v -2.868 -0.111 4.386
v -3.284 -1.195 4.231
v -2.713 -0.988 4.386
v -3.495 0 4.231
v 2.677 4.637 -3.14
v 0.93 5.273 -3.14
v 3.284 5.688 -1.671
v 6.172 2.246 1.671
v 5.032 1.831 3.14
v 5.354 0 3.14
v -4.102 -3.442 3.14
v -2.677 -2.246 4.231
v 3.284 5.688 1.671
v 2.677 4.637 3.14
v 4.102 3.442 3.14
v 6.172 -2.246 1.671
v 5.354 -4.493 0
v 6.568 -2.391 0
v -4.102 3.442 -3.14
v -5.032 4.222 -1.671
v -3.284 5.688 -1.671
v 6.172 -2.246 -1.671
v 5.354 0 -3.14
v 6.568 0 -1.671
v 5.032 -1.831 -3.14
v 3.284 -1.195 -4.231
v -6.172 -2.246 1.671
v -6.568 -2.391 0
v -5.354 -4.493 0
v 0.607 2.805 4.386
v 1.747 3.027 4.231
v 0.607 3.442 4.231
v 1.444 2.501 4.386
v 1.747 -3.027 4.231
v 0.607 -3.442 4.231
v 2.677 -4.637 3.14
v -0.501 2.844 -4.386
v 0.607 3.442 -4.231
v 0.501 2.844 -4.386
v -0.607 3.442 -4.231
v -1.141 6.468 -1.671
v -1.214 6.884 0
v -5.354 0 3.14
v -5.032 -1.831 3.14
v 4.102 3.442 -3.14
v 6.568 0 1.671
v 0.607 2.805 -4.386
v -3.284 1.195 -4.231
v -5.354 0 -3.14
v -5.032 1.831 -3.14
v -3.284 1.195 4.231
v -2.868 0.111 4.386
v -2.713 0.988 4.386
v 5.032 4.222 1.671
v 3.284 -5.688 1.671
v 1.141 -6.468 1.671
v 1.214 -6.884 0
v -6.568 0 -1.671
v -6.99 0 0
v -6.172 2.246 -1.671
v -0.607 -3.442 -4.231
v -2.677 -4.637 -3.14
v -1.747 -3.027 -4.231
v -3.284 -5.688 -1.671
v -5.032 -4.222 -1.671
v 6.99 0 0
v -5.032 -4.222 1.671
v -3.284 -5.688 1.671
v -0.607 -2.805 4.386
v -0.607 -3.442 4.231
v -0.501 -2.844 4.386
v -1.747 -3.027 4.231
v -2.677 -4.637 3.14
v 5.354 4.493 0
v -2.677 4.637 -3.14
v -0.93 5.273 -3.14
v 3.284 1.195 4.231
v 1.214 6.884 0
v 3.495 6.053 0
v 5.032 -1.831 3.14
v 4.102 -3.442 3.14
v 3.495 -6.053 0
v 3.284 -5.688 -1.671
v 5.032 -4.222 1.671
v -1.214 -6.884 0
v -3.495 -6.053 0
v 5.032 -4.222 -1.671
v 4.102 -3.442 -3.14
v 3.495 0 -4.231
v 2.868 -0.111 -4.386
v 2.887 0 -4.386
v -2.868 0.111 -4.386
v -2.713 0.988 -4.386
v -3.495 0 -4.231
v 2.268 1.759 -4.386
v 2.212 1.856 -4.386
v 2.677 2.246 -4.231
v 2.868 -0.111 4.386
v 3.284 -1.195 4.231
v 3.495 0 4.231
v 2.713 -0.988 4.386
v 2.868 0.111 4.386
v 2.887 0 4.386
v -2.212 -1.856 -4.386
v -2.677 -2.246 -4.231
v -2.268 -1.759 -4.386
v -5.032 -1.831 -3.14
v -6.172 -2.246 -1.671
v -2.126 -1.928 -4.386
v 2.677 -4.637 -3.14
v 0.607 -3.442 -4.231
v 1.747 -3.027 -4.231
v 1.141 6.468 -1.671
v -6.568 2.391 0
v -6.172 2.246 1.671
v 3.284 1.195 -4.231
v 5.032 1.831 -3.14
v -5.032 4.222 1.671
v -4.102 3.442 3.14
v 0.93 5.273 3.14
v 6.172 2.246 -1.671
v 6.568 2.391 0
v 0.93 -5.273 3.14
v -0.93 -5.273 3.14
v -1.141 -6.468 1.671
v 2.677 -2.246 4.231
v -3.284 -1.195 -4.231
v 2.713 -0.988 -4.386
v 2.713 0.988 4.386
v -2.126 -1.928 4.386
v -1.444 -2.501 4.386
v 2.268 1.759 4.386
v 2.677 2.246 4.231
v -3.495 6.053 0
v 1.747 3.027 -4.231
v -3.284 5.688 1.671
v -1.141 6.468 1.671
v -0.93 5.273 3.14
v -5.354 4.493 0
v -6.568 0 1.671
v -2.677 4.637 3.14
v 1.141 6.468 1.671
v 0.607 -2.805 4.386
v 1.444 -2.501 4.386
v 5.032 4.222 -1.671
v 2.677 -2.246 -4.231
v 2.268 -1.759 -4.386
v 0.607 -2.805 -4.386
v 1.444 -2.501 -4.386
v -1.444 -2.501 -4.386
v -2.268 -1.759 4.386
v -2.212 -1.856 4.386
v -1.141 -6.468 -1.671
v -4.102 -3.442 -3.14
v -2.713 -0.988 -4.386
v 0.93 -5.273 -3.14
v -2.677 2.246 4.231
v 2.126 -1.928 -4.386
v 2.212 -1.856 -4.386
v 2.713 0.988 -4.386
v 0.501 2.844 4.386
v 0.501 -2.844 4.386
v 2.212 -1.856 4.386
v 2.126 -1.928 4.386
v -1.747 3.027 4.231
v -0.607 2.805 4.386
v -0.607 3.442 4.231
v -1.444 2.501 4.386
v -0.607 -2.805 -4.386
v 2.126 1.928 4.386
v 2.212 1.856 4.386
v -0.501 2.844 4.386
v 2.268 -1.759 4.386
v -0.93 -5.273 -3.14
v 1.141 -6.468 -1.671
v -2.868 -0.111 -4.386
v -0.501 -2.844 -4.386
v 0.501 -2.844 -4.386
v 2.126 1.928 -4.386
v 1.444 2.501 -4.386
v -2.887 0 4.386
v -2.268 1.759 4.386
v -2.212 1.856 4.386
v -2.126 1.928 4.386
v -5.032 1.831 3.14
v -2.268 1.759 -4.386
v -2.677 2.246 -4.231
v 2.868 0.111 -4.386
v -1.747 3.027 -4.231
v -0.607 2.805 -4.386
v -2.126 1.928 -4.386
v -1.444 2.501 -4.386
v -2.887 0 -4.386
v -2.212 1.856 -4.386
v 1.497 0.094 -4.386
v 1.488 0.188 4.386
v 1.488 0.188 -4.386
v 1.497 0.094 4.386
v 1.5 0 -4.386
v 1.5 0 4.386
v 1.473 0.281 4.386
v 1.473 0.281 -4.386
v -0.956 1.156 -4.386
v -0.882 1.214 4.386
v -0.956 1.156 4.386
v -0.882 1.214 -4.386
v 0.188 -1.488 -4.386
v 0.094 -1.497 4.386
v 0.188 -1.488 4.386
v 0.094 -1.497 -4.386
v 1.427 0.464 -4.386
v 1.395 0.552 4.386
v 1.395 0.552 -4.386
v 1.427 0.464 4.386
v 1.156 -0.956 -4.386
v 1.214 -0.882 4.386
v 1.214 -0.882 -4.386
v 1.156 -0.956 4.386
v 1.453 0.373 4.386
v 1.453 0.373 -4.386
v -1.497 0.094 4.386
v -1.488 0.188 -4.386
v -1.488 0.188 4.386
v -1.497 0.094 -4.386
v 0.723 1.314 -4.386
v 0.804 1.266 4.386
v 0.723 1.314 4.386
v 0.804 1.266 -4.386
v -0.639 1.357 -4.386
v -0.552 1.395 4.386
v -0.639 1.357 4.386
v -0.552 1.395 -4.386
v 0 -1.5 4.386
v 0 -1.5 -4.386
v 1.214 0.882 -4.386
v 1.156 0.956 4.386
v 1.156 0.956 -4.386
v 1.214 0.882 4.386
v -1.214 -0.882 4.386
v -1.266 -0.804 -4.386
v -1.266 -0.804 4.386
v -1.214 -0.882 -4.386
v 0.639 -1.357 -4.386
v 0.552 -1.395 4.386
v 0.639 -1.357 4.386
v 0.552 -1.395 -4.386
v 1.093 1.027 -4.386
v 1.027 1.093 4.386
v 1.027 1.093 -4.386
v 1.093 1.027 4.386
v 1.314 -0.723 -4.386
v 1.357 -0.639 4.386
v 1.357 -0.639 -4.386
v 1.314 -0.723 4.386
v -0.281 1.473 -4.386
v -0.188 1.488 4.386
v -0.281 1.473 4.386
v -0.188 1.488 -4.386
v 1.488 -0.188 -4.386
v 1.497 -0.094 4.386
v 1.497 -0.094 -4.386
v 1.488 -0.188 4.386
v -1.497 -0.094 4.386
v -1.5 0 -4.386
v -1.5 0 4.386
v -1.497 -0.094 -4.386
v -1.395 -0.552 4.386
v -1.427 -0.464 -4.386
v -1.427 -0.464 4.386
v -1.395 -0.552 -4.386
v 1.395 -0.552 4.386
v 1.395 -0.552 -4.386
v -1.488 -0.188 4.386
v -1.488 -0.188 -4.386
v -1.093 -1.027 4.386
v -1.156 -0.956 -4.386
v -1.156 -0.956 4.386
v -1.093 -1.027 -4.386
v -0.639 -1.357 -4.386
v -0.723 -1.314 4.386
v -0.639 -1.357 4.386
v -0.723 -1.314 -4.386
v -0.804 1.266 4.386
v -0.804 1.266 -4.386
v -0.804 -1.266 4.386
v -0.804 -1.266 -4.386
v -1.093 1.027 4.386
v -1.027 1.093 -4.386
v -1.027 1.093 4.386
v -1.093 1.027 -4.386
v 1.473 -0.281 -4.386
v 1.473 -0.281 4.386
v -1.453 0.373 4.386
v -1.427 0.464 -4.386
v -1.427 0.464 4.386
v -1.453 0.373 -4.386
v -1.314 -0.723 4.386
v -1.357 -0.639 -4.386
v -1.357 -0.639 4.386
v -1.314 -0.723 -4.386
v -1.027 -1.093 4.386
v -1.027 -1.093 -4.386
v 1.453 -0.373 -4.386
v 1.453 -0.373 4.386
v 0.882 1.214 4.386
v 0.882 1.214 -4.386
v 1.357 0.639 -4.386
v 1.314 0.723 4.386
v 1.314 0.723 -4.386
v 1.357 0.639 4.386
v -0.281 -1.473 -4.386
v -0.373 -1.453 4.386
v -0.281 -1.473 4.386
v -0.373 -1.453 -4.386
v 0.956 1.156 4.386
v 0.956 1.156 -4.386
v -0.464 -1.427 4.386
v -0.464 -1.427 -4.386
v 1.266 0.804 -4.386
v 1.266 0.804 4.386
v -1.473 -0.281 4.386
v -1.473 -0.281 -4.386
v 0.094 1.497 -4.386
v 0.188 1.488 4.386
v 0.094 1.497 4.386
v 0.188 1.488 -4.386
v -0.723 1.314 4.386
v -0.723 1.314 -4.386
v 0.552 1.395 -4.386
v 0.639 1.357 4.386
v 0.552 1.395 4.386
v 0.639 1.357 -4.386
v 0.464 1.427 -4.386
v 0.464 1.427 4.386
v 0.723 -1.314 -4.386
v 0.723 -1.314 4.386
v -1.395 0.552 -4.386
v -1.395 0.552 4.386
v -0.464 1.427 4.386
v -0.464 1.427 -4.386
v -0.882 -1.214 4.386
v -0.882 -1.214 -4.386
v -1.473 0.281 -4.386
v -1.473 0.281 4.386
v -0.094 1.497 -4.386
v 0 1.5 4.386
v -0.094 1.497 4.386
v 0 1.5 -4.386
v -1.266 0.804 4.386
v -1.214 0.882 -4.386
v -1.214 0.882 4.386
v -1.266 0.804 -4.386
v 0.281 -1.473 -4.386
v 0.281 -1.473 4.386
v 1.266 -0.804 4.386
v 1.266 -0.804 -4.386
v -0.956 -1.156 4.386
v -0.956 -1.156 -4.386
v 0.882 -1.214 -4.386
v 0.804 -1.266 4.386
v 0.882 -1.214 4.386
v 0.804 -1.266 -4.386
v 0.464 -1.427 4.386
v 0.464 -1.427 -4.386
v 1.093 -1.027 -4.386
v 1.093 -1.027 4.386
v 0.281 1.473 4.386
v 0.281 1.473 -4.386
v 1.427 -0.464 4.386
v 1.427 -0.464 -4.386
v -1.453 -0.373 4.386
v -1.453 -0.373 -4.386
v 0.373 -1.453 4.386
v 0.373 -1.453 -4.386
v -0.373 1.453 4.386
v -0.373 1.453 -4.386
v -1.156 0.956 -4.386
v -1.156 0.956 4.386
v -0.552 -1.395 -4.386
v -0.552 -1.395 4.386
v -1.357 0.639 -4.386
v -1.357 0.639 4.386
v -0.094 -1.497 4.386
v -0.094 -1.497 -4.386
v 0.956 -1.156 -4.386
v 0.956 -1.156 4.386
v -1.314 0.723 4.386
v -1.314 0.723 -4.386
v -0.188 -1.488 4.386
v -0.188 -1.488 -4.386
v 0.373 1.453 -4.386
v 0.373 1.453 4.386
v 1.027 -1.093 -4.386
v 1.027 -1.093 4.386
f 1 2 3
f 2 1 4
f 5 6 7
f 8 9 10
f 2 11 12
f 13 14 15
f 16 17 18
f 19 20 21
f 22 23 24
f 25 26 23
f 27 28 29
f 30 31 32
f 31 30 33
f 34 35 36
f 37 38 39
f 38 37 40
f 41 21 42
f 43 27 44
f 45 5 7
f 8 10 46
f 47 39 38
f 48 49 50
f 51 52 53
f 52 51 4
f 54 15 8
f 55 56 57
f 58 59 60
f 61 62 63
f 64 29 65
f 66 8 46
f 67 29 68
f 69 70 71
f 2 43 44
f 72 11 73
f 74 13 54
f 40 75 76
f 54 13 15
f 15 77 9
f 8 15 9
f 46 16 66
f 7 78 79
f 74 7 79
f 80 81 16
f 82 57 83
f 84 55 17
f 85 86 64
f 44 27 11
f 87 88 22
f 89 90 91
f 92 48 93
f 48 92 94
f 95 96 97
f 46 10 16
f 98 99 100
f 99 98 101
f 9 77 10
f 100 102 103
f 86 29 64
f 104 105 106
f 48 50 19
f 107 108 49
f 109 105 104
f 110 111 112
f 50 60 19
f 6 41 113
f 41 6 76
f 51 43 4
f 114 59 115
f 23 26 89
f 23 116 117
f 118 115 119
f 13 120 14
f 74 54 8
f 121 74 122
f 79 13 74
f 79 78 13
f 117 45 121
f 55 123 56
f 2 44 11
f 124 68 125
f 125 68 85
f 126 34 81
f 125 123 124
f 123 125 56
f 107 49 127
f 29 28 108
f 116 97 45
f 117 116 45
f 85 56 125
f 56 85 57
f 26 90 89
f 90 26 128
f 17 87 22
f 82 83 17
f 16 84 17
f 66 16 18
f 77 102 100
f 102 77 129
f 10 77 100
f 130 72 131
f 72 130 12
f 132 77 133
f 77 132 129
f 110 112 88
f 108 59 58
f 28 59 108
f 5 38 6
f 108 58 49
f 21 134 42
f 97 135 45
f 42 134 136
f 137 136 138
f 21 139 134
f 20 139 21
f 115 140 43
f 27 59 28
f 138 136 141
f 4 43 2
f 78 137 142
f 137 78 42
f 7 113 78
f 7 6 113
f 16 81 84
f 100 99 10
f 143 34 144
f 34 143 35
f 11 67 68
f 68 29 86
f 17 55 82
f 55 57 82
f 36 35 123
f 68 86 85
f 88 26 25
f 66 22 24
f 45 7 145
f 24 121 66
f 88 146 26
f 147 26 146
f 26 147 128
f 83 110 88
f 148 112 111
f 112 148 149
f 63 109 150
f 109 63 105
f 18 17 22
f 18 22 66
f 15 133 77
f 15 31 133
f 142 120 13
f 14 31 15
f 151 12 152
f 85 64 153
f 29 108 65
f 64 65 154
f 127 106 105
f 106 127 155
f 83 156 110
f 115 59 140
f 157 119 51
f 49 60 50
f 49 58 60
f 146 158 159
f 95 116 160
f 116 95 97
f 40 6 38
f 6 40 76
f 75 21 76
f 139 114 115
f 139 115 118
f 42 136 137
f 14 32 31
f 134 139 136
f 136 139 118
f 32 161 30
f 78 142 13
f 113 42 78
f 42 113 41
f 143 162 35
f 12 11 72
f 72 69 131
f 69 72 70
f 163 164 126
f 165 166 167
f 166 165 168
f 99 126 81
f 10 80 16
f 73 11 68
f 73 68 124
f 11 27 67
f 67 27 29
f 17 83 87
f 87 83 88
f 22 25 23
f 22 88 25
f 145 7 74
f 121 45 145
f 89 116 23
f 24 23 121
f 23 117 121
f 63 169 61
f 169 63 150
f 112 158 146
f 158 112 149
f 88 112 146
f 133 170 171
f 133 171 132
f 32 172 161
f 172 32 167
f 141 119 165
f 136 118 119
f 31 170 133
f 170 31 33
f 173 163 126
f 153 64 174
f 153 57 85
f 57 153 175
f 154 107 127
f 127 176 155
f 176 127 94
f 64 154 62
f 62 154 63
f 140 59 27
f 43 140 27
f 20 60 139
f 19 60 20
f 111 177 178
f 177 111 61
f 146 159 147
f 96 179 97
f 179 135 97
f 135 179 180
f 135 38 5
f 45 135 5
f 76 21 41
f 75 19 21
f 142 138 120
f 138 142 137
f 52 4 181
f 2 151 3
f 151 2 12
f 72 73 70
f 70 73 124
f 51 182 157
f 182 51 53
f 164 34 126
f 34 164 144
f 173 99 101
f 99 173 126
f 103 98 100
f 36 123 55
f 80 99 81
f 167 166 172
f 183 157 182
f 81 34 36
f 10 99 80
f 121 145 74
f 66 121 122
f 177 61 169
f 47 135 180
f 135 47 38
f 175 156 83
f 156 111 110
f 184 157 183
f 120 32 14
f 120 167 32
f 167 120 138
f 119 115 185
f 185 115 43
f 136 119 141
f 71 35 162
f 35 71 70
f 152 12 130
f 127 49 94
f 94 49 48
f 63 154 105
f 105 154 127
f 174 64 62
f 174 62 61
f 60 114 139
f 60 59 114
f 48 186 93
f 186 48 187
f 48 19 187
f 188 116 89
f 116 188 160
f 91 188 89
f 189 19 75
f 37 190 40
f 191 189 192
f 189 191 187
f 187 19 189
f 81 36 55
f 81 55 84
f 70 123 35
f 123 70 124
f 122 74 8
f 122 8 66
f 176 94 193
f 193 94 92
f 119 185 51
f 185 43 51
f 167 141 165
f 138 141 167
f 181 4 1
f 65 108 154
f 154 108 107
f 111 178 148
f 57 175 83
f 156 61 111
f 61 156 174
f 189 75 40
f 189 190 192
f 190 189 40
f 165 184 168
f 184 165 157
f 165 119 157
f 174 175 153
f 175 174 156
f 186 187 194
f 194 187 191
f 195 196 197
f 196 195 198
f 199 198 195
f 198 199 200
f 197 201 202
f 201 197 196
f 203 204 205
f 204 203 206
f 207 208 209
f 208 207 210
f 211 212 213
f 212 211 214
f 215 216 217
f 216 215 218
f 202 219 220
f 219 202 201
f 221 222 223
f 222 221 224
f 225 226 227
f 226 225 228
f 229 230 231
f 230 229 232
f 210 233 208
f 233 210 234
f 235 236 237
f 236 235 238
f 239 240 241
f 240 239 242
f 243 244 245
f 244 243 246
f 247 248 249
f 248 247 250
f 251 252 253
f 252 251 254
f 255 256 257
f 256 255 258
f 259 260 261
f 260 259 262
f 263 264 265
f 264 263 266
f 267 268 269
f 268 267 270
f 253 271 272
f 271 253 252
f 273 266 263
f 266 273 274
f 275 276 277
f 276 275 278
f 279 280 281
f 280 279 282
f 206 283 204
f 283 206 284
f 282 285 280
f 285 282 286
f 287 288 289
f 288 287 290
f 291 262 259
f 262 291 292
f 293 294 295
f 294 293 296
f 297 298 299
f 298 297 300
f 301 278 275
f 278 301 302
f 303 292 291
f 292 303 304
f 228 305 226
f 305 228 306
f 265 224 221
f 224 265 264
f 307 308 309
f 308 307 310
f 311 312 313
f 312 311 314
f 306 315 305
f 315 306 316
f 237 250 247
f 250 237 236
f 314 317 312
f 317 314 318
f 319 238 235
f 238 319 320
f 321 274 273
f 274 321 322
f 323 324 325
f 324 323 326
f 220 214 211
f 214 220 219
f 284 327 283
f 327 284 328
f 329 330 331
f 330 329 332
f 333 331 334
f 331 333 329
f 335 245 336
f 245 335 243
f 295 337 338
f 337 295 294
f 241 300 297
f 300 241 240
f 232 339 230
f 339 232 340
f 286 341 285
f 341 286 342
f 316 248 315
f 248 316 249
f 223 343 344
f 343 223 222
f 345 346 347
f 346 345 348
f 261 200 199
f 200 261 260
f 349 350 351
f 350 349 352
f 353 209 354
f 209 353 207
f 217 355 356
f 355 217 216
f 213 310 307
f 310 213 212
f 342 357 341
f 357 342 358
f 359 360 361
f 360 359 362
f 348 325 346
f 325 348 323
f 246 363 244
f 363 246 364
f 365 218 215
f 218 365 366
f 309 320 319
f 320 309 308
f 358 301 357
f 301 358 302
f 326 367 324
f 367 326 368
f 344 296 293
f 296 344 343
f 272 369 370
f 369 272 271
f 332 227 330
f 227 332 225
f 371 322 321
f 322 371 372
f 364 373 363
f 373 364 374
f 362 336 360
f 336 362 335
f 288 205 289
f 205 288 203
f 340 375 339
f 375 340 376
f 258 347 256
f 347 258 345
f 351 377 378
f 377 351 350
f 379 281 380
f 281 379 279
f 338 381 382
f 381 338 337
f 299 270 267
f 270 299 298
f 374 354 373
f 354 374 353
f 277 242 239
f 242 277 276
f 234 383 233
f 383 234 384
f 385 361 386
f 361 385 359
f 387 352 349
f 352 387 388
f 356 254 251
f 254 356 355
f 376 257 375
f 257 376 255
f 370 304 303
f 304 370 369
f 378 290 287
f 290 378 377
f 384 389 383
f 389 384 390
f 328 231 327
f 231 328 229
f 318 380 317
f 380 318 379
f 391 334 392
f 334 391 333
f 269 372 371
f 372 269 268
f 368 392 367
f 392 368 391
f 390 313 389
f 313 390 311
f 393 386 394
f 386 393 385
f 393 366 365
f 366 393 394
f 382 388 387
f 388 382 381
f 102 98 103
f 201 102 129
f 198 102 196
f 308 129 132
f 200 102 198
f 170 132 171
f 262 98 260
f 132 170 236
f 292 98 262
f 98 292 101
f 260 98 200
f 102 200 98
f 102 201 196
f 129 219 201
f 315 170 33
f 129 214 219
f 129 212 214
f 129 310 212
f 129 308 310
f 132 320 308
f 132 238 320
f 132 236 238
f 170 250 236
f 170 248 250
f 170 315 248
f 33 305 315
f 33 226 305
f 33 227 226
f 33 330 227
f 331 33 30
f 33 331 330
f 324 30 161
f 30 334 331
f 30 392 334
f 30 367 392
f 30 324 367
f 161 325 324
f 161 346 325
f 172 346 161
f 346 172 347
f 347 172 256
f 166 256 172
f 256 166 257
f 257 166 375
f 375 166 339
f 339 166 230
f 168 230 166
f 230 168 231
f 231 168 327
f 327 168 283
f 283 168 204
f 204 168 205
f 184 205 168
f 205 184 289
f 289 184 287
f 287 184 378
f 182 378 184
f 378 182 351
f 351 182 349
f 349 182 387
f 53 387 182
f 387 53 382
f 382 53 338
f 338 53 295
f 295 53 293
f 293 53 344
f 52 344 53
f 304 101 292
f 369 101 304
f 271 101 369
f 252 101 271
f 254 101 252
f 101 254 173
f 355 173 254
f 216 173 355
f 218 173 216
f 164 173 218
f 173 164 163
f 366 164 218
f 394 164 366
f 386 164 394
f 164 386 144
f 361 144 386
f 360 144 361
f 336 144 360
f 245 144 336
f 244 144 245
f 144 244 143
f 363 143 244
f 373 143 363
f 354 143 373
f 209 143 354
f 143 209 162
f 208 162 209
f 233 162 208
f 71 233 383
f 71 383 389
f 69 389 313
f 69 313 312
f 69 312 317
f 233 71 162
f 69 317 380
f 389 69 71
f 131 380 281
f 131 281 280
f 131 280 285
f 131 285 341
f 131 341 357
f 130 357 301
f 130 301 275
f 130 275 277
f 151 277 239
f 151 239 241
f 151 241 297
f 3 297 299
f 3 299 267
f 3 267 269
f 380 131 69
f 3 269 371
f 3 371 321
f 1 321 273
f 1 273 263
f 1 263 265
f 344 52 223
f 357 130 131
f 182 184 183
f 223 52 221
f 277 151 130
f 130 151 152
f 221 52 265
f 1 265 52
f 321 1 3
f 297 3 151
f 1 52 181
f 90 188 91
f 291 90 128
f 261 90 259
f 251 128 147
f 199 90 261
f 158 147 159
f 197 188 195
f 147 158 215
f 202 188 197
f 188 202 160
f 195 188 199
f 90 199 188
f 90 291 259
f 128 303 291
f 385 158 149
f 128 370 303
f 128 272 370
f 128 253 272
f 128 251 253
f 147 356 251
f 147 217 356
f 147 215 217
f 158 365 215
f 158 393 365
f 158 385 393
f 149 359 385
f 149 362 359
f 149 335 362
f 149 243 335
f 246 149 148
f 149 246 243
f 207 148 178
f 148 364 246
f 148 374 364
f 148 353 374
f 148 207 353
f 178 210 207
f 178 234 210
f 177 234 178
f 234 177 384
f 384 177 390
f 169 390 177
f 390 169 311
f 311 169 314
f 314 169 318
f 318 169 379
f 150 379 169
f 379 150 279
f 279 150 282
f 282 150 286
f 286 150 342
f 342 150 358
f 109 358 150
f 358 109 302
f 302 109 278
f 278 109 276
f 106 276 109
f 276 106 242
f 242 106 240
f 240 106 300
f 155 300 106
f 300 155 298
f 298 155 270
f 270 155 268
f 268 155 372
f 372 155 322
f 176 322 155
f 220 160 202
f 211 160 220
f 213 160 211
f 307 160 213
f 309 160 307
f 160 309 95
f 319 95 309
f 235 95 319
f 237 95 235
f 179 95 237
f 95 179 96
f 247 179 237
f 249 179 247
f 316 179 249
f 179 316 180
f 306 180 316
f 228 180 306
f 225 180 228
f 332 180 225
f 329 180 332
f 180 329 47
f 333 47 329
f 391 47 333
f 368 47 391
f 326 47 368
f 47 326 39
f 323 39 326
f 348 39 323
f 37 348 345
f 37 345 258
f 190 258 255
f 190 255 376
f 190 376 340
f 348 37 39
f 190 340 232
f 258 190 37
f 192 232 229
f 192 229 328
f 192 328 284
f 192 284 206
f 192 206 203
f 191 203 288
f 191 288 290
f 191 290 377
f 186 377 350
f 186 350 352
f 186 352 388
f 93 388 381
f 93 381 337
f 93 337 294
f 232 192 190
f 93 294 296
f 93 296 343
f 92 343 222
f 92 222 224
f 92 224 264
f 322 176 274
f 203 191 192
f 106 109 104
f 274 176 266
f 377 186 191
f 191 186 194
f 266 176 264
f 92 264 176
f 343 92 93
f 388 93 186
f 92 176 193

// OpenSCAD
//Author: Sometimes Cake
//Date: 5/11/2014
//Modified Date: 2/6/2016 - modified for customizer changes.

//Modified by Daniel K. Schneider 6/7/2016
// Added: Resolution and CutAway parameters
// Changed parameter names
// Changed the way the dimeions are computed

/* [Running/Walking] */
RunningDistance=5; //[2:100]
RunningDuration=25; //[10:600]
/* [Dimensions] */
CutAway=0.5; //[0.5,0.7,0.8,1,1.5,2,3,4]]
HoleDiameter=3; //[1:5]
ScaleFactor=1; //[0.5,1,1.5,2,2.5,3]

/* [Hidden] */
$fn = 100; //sets the smoothness of the whole
AverageSpeed = RunningDistance / RunningDuration * 60;
Resolution   = ln(AverageSpeed*AverageSpeed*AverageSpeed)*2.5;
BeadDiameter = log(RunningDuration)*10;  //One hour running is about 1.7cm bead
SkewFactor   = log(RunningDistance) ; // log10, so running 10km = 1

echo ("RunningDistance=", RunningDistance);
echo ("RunningDuration=", RunningDuration );
echo ("AverageSpeed=", AverageSpeed);
echo ("Resolution= ", Resolution );
echo ("BeadDiameter= ", BeadDiameter );
echo ("SkewFactor= ", SkewFactor );

scale ([ScaleFactor,ScaleFactor,ScaleFactor]) {
     difference() {
	  scale ([1,1,SkewFactor])
	       sphere (BeadDiameter/2, $fn=Resolution);
	  
	  // Dig the hole
	  translate([0,0,(BeadDiameter*3)*(-1)])
	  cylinder (BeadDiameter*6,HoleDiameter/2, HoleDiameter/2);
	  
	  // cut off a little bit on top to make it more printable
	  translate([0,0,SkewFactor*BeadDiameter/2-CutAway])
	  cylinder (BeadDiameter/2, BeadDiameter, BeadDiameter);
	  
	  // cut off a little bit at the bottom to make it more printable
	  # translate([0,0,-1*SkewFactor*BeadDiameter/2 - BeadDiameter/2 + CutAway])
	  cylinder (BeadDiameter/2, BeadDiameter, BeadDiameter);
     }
}
     

/* 
All size measurement are in mm. Running is in km's and minutes.
Runners do a km in 5-6 minutes. Fast ones in 7. Walkers need 12-15 minutes.
Marathon:
RunningDistance = 42.195;     //[4:100]
RunningDuration = 123;     //[15:600]
Typical Jogging:
RunningDistance = 10;     //[4:100]
RunningDuration = 60;     //[15:600]
*/
